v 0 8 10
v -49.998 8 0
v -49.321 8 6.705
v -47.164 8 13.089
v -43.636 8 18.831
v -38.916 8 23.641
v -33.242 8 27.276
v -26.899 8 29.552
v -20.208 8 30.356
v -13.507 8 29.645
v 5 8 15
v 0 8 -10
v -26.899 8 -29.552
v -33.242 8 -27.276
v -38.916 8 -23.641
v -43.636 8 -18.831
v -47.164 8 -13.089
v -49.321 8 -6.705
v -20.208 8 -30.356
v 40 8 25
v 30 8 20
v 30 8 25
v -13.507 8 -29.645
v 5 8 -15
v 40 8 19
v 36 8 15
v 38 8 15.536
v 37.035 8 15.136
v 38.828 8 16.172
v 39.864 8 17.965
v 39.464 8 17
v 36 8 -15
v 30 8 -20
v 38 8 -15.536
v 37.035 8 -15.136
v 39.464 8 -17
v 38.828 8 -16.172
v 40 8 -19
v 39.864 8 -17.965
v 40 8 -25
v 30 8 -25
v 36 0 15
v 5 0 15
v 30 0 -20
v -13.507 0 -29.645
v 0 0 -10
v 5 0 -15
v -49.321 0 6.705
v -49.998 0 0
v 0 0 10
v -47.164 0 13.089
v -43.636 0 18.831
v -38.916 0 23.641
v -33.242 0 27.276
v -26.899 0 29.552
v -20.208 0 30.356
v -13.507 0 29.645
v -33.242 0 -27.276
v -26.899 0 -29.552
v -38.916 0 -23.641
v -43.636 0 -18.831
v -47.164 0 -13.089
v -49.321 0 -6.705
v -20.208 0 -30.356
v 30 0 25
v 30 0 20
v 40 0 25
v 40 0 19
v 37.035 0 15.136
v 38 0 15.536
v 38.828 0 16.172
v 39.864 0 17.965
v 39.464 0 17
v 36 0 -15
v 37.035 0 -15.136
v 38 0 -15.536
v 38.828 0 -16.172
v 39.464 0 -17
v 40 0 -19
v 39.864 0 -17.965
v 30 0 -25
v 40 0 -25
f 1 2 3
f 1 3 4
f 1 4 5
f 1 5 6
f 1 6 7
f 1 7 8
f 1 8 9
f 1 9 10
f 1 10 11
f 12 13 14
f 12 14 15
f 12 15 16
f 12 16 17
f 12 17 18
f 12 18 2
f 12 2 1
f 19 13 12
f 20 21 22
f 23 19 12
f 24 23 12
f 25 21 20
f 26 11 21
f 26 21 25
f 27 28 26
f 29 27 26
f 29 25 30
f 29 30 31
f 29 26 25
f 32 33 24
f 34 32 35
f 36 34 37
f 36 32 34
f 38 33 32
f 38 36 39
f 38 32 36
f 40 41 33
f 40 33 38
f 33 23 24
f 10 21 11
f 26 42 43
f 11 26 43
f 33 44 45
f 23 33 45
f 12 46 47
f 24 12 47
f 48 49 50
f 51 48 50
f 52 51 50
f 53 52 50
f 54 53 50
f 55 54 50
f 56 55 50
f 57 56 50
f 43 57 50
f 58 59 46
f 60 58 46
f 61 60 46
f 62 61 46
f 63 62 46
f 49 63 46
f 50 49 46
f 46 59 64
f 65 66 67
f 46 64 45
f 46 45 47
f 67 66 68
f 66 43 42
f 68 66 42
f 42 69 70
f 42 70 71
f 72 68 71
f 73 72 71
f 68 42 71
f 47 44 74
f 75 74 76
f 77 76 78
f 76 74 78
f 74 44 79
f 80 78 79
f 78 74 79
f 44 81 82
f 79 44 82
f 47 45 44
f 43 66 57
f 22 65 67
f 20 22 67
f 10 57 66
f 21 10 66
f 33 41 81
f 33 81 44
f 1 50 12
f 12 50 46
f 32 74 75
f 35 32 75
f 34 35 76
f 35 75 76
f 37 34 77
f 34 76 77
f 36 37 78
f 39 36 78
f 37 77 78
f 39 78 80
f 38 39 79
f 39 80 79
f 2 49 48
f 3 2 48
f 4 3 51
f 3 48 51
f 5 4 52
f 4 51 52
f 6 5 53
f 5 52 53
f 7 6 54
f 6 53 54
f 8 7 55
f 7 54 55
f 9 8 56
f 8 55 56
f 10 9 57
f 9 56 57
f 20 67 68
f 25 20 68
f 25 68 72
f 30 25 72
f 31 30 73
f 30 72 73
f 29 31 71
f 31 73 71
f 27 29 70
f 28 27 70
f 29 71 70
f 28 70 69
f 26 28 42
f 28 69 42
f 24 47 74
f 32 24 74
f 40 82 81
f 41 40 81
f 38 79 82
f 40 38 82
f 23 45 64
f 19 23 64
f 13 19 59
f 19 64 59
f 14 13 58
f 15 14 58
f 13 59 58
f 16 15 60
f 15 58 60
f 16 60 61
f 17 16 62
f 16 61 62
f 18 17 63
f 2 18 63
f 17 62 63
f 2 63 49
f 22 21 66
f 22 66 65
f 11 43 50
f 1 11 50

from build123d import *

# Parameters (mm, degrees)
P_IDAT_VYSUNUT_M2_DEPTH = 8


with BuildPart() as part:
    # Skica1 → Přidat vysunutím2 (new body)
    with BuildSketch(Plane(origin=(0, 0, 0), x_dir=(1, 0, 0), z_dir=(0, 1, 0))):
        with BuildLine():
            Line((0, -10), (0, 10))
            Line((0, 10), (5, 15))
            Line((5, 15), (36, 15))
            ThreePointArc((36, 15), (38.828427125, 16.171572875), (40, 19))
            Line((40, 19), (40, 25))
            Line((40, 25), (30, 25))
            Line((30, 25), (30, 20))
            Line((30, 20), (-13.506811582, 29.645227916))
            ThreePointArc((-13.506811582, 29.645227916), (-38.916330448, 23.640944379), (-49.997883531, 0))
            ThreePointArc((-49.997883531, 0), (-38.916330448, -23.640944379), (-13.506811582, -29.645227916))
            Line((-13.506811582, -29.645227916), (30, -20))
            Line((30, -20), (30, -25))
            Line((30, -25), (40, -25))
            Line((40, -25), (40, -19))
            ThreePointArc((40, -19), (38.828427125, -16.171572875), (36, -15))
            Line((36, -15), (5, -15))
            Line((5, -15), (0, -10))
        make_face()
    extrude(amount=P_IDAT_VYSUNUT_M2_DEPTH)


solid = part.part
